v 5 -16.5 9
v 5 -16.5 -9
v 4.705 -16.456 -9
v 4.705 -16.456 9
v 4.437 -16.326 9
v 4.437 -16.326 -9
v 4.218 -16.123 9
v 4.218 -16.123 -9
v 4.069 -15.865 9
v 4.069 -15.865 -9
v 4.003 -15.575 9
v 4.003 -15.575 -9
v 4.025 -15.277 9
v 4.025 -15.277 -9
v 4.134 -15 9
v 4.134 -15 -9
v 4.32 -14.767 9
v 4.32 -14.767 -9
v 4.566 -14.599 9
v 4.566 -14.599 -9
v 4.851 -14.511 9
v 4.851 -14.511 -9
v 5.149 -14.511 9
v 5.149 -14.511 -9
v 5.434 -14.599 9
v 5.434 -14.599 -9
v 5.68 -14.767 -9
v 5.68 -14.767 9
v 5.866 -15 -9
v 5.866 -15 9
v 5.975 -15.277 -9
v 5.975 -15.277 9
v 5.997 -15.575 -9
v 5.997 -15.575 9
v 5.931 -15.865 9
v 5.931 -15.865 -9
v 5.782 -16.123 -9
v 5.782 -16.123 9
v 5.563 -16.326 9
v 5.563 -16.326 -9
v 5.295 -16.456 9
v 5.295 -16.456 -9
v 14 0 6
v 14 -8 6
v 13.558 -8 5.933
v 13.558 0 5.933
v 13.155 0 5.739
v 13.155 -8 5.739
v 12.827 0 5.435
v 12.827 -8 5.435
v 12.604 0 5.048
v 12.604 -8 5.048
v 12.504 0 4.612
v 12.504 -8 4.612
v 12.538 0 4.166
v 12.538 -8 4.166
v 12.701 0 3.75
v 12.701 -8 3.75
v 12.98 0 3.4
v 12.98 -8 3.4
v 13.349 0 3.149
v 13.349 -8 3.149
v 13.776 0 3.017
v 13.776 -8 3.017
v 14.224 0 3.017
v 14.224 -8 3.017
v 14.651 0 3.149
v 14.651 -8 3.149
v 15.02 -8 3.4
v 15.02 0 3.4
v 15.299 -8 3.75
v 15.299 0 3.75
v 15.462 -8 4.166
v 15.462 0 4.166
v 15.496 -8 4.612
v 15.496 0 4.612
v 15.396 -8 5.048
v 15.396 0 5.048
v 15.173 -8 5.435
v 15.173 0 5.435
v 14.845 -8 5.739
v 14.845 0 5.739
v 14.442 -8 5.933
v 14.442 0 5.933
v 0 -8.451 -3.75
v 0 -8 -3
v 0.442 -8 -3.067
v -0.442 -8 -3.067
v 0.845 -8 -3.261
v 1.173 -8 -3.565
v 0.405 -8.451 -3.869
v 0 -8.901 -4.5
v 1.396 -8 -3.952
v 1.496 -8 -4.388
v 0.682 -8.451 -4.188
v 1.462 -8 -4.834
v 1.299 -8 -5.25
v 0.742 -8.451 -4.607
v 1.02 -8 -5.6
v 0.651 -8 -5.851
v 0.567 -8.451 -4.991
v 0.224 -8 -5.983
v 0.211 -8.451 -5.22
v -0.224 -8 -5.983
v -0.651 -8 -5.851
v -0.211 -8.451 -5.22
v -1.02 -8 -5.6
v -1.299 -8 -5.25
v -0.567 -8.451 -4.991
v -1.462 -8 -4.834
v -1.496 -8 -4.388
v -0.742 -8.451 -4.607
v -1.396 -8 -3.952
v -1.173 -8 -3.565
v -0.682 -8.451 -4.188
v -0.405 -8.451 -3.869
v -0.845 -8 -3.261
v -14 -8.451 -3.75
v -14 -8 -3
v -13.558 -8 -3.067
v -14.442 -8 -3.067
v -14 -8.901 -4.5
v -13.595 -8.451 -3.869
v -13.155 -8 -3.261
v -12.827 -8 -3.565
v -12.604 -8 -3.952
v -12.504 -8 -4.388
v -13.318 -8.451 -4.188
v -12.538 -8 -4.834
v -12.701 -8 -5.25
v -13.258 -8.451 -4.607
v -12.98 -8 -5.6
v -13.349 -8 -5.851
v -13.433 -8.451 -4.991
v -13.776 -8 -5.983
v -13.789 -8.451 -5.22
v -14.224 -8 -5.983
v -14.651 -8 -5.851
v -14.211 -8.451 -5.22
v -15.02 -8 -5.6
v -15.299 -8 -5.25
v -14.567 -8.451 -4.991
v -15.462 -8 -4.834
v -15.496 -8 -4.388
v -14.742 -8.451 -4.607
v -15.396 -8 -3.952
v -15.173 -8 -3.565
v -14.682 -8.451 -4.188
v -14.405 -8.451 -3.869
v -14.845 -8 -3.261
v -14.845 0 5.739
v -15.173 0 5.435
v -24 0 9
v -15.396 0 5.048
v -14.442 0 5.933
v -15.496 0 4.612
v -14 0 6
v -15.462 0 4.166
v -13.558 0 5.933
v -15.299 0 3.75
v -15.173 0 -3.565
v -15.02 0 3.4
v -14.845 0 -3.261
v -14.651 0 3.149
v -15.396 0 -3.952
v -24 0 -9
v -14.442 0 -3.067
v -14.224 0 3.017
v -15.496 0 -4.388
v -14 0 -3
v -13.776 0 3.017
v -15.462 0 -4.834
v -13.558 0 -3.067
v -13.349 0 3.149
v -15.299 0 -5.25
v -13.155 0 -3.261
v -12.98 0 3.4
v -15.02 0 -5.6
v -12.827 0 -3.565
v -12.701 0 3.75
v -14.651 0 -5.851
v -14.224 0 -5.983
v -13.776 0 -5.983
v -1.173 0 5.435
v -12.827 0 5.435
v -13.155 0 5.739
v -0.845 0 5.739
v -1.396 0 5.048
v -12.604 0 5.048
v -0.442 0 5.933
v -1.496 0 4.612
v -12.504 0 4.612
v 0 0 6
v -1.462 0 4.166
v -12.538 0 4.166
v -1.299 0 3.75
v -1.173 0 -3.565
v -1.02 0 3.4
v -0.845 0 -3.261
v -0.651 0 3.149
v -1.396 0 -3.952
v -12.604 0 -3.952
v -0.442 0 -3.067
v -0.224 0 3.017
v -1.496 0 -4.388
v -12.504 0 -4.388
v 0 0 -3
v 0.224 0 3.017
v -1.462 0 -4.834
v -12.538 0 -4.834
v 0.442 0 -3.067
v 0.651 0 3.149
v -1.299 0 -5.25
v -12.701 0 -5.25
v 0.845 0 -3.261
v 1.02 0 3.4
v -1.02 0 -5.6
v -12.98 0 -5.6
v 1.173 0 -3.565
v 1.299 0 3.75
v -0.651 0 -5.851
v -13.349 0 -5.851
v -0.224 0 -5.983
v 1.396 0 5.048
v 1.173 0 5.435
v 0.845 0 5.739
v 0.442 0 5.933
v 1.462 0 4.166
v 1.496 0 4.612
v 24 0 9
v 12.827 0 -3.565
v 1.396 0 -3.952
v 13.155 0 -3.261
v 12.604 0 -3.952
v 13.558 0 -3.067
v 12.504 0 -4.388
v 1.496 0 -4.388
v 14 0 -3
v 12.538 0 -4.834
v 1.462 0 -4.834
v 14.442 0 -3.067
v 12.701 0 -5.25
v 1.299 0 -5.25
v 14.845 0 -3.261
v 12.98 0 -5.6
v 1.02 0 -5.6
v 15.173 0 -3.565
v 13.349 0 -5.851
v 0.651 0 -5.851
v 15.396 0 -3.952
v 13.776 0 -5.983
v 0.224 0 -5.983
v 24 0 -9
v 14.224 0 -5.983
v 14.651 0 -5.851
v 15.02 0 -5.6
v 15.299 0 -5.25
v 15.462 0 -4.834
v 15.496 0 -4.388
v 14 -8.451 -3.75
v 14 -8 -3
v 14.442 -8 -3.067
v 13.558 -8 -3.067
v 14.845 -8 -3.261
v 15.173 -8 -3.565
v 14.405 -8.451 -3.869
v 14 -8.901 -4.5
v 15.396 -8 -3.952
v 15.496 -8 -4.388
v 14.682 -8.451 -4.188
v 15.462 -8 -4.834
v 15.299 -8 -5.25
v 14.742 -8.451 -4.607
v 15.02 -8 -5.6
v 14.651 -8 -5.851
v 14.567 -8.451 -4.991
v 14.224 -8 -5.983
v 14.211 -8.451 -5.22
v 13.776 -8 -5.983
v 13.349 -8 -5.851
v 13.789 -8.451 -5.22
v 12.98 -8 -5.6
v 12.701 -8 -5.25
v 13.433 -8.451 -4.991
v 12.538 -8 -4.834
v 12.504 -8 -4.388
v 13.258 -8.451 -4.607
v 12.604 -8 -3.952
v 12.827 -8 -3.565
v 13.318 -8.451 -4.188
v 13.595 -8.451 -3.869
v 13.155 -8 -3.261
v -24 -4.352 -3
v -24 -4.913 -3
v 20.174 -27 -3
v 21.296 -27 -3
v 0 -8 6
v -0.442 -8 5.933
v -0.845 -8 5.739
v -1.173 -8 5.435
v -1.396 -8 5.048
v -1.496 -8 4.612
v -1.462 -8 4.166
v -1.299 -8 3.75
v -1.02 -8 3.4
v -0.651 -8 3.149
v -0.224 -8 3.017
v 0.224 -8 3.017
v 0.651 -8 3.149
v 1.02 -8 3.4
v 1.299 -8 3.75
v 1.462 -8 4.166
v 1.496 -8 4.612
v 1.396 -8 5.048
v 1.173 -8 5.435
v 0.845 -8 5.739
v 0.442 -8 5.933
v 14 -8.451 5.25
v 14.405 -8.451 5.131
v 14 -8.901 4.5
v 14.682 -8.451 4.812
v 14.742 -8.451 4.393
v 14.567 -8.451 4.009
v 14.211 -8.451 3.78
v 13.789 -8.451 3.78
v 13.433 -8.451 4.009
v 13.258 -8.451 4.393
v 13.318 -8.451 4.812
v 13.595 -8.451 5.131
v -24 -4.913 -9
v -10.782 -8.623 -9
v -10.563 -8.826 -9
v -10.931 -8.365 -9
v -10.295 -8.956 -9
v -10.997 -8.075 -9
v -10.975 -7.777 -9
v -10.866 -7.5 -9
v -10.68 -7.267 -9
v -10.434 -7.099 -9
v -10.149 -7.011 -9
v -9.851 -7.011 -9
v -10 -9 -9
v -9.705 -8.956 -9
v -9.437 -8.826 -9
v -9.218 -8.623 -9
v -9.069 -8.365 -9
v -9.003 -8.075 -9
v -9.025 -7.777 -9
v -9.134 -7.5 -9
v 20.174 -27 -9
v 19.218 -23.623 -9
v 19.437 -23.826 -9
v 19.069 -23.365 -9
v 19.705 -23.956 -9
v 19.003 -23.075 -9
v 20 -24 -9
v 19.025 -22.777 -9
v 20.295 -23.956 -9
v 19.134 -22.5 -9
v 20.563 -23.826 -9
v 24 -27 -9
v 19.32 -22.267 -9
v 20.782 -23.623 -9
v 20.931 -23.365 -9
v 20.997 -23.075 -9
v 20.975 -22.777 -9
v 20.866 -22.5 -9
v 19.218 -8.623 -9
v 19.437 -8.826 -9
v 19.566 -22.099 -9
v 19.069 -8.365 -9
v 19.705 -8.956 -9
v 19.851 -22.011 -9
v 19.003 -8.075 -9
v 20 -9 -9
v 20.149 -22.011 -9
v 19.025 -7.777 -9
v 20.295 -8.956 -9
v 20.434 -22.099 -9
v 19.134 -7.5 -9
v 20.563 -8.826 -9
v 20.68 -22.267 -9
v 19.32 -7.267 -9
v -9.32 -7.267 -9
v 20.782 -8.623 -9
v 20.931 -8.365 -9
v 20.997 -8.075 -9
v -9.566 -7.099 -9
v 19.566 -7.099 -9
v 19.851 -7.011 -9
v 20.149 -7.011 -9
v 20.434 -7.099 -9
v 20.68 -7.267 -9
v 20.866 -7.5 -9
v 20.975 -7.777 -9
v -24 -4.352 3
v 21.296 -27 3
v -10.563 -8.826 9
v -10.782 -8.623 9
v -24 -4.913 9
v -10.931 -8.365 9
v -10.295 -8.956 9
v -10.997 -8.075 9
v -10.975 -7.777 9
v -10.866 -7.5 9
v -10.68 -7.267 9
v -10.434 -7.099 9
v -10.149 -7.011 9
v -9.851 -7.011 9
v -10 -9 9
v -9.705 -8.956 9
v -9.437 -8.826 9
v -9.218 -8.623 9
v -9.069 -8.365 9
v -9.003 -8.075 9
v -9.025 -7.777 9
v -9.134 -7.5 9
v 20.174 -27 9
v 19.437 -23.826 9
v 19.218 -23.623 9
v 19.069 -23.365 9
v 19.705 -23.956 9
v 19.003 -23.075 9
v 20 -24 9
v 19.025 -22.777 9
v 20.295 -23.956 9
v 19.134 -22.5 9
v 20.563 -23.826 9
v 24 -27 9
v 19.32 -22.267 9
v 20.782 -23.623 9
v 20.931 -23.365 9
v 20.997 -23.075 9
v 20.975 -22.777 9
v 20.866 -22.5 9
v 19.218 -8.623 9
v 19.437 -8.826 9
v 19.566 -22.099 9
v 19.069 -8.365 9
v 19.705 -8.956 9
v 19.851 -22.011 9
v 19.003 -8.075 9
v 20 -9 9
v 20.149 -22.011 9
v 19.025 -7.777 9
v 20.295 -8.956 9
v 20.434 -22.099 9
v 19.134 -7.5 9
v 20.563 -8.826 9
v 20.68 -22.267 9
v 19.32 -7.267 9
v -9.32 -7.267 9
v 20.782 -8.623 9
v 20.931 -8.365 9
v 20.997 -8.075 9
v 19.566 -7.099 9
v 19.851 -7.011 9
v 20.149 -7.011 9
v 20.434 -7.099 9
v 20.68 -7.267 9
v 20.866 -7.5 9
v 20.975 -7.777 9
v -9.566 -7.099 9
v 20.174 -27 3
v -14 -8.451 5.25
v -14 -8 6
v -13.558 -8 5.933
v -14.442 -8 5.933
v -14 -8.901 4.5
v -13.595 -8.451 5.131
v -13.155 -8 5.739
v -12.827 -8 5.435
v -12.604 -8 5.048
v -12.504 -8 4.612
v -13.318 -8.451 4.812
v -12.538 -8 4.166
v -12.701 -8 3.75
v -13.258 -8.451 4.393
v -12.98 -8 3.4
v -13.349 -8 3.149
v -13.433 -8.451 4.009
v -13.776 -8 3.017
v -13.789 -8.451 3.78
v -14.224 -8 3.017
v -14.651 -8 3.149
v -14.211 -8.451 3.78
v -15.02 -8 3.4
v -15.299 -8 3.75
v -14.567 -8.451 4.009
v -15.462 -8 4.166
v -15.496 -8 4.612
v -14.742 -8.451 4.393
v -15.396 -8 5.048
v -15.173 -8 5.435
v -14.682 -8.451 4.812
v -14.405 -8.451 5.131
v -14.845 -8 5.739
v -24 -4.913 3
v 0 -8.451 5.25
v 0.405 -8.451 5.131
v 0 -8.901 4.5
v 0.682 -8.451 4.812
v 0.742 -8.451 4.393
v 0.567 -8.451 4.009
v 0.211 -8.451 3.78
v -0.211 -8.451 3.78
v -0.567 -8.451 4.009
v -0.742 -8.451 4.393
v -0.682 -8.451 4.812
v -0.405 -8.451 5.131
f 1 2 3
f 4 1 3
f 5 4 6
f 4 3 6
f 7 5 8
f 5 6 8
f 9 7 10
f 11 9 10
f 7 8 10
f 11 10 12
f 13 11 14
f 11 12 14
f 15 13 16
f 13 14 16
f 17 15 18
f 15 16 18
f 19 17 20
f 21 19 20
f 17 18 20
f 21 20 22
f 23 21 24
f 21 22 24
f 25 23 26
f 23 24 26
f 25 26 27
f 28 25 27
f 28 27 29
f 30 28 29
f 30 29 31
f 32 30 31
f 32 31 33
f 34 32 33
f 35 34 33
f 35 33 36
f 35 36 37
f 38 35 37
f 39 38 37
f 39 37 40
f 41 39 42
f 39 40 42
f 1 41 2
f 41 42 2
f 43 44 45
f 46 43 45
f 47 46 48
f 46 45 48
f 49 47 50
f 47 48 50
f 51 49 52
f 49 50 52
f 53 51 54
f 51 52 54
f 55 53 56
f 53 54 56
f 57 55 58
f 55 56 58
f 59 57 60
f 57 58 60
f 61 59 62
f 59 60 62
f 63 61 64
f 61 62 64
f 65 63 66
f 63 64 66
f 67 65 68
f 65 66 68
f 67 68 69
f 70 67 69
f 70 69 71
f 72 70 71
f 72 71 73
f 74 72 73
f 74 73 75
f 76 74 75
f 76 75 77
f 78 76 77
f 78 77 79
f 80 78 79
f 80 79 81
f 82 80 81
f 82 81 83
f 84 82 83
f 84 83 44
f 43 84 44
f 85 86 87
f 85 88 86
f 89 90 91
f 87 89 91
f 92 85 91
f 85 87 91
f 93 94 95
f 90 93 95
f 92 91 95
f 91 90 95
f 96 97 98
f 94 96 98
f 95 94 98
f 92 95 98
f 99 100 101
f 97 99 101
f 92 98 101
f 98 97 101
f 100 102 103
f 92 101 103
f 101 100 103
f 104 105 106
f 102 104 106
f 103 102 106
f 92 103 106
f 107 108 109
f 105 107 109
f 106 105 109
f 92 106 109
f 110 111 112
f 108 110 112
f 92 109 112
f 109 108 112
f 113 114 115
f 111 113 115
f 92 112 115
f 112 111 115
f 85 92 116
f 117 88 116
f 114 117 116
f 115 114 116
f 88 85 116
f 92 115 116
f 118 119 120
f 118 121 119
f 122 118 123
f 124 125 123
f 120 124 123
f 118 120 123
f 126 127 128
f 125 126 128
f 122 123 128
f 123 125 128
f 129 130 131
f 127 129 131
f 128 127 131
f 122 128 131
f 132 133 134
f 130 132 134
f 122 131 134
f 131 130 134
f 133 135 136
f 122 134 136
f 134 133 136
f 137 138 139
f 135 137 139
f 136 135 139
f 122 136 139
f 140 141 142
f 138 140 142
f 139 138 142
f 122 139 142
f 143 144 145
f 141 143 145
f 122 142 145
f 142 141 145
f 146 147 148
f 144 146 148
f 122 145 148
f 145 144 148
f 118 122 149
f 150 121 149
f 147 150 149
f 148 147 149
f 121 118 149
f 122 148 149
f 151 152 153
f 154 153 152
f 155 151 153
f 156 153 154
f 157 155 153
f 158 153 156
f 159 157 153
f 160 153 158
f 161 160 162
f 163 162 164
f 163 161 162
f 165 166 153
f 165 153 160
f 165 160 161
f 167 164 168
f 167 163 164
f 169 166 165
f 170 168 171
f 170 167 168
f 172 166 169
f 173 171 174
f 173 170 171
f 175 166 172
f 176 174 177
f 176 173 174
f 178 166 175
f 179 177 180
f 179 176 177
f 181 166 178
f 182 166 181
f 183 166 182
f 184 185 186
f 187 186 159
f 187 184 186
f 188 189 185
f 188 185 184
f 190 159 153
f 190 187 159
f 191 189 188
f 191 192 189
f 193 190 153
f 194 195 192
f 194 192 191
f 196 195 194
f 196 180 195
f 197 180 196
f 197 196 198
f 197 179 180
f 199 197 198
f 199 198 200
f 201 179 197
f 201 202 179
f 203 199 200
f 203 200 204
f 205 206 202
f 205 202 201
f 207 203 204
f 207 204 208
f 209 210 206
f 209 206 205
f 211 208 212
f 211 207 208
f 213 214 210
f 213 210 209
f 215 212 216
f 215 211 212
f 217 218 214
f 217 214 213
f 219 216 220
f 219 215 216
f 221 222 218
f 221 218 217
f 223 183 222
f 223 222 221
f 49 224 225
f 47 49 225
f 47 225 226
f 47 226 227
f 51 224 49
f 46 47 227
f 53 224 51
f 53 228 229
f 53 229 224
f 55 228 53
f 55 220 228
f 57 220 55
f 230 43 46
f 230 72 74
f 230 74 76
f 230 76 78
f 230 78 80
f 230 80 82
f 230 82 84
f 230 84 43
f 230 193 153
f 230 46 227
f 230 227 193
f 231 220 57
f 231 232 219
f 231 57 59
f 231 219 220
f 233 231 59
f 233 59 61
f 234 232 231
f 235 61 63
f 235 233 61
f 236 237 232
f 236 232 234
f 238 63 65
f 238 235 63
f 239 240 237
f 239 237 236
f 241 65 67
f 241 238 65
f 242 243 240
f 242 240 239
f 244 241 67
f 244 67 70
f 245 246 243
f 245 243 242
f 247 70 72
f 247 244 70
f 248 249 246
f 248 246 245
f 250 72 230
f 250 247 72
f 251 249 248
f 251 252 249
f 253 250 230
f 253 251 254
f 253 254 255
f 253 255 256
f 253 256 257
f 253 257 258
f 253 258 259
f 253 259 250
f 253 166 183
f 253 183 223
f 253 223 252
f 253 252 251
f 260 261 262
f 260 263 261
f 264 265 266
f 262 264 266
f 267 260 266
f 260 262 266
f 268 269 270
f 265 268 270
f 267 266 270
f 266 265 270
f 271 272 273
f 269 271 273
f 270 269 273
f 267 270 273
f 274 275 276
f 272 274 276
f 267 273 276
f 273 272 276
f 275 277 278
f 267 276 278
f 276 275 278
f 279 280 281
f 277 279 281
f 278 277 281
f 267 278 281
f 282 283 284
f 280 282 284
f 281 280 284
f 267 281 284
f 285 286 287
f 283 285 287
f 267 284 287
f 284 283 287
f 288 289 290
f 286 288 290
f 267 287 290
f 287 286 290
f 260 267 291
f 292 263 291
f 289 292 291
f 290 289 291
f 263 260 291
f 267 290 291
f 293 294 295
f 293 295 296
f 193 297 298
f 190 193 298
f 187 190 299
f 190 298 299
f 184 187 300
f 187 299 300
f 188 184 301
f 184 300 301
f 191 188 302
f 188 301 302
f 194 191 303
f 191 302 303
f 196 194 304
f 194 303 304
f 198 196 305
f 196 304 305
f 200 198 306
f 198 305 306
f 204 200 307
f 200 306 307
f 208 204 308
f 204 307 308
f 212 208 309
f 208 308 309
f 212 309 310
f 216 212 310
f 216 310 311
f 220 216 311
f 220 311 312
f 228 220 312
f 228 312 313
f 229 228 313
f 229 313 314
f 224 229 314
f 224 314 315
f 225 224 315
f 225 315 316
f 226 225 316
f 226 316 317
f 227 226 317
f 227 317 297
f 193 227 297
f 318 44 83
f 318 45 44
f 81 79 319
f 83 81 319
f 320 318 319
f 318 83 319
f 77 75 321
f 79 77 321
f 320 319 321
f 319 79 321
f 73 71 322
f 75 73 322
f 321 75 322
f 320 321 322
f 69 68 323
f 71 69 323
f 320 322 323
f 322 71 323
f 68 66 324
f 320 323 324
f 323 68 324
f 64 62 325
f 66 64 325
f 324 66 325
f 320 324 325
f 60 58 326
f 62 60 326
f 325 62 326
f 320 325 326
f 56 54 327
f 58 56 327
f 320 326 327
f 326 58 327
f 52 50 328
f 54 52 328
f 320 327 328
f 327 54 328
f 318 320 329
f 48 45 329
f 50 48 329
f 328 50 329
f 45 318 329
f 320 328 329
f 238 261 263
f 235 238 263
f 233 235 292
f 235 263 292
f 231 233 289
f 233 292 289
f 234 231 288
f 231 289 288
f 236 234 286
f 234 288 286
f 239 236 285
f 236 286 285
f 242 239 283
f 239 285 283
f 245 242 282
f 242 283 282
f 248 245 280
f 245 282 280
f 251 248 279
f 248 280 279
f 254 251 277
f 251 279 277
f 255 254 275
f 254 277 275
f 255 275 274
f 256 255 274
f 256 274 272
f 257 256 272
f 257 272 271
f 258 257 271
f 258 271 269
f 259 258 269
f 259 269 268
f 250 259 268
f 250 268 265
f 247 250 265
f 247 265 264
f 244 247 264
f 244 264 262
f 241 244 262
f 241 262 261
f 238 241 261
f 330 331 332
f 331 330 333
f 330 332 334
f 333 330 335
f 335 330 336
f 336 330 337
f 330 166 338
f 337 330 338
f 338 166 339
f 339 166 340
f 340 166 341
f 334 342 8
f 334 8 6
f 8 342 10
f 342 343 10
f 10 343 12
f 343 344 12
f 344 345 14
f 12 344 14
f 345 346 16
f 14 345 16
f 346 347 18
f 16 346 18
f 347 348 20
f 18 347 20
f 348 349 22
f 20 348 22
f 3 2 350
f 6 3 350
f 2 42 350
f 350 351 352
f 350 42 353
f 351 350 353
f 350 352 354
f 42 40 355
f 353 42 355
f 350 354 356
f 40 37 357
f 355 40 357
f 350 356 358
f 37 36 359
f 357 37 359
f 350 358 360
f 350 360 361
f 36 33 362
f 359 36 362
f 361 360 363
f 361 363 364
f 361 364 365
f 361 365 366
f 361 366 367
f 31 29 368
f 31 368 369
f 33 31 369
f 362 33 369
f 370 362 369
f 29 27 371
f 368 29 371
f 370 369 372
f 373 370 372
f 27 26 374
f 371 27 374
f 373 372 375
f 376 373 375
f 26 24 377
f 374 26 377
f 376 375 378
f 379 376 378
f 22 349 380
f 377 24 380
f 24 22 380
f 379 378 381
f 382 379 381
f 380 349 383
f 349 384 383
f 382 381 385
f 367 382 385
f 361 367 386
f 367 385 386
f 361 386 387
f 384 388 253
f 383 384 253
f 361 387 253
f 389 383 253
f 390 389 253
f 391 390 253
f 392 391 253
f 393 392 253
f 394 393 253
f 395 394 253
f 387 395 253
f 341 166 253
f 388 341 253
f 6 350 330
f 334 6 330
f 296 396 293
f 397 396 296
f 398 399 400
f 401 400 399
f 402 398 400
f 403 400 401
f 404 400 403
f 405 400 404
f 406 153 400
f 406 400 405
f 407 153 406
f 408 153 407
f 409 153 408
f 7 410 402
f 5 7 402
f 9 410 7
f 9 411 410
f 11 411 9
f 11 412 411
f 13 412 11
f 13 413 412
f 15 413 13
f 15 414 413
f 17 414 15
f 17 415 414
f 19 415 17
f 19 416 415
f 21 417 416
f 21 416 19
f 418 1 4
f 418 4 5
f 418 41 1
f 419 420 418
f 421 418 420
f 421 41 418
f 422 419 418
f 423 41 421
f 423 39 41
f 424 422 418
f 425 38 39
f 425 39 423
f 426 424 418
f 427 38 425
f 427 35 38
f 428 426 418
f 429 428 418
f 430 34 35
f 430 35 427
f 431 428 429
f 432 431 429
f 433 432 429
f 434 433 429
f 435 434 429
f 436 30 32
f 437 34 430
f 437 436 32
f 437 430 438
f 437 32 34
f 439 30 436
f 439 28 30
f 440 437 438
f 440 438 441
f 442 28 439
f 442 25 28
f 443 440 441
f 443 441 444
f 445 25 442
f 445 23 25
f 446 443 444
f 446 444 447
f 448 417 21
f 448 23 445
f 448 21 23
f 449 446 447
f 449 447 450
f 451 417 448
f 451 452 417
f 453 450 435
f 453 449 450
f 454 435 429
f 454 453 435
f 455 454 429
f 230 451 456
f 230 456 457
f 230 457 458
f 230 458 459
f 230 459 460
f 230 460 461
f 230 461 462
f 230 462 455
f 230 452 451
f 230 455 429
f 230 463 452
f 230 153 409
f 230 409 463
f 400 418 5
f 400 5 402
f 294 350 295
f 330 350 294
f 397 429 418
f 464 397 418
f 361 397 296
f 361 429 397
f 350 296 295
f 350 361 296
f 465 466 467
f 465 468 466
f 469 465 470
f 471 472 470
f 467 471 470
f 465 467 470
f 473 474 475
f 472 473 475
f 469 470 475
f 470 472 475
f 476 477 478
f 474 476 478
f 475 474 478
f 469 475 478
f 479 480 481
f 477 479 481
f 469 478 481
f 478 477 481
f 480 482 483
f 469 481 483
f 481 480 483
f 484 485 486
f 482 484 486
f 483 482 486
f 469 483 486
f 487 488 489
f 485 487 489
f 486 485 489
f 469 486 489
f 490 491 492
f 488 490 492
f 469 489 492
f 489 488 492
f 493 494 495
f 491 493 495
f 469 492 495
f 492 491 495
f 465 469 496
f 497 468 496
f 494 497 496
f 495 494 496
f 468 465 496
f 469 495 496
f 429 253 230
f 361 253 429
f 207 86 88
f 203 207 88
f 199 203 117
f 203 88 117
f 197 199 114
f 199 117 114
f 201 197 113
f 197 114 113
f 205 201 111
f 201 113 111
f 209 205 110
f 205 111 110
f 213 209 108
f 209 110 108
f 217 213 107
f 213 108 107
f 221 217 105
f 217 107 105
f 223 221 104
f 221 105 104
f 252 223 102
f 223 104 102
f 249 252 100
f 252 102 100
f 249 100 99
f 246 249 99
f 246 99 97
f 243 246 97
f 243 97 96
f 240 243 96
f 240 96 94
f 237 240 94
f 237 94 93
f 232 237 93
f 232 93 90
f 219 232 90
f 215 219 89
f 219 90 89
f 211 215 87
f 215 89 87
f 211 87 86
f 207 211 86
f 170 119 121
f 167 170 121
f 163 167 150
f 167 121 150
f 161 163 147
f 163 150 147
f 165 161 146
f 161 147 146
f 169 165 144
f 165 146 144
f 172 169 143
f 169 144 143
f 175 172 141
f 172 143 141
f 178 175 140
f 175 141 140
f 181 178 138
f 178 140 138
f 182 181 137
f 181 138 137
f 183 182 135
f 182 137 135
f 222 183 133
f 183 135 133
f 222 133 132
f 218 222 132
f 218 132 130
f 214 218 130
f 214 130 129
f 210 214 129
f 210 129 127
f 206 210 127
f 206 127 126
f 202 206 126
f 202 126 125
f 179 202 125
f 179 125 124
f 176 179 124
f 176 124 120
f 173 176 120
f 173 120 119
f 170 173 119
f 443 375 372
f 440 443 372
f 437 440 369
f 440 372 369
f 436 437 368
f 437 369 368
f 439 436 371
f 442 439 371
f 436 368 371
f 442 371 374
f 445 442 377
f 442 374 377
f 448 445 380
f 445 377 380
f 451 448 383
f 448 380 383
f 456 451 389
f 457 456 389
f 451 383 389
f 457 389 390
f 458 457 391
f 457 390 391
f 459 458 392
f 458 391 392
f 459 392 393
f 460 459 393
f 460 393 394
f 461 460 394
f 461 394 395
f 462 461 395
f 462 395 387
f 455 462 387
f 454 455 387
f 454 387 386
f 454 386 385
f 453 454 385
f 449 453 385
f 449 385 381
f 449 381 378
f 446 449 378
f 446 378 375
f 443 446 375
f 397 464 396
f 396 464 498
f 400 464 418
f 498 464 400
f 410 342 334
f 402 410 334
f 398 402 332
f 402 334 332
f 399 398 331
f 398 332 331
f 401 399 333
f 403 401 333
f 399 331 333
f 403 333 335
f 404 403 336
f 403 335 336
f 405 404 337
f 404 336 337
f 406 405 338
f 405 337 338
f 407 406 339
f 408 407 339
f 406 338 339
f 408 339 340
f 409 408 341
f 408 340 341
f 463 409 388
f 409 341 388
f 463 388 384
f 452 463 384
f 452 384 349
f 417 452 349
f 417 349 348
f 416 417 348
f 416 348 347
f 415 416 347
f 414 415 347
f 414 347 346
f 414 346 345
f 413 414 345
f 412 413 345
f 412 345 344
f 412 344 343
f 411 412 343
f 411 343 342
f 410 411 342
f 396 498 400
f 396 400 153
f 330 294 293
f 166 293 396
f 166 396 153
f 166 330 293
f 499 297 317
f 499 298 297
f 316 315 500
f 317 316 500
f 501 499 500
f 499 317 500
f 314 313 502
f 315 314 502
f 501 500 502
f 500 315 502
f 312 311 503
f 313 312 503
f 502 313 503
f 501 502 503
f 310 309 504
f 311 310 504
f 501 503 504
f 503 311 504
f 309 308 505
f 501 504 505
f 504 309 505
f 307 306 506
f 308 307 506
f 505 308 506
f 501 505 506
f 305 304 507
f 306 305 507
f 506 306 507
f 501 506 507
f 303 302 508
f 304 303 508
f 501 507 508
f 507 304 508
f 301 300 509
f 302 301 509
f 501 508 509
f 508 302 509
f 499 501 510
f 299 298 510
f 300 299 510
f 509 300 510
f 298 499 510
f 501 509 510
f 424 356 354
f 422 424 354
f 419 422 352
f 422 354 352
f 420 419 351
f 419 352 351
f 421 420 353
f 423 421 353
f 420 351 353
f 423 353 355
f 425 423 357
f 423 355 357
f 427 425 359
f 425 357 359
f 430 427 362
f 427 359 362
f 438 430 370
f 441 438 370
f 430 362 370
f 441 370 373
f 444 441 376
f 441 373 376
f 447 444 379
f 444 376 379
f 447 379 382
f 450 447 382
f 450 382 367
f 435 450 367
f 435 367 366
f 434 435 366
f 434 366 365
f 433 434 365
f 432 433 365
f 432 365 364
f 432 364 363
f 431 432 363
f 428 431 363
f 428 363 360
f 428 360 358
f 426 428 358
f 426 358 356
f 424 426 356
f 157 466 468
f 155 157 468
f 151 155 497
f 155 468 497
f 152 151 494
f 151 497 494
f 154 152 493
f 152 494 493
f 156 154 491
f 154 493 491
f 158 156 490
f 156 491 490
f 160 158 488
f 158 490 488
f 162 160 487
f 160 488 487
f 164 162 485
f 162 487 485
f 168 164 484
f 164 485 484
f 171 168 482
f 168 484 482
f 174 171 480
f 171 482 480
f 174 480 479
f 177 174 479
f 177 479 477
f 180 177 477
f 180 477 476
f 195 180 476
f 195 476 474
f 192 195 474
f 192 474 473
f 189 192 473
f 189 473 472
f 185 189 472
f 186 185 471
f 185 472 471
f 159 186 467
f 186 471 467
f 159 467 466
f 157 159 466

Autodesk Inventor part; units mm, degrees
ref_plane "YZ Plane" through (0, 0, 0) normal (1, 0, 0) x (0, 1, 0)
ref_plane "XZ Plane" through (0, 0, 0) normal (0, 1, 0) x (-1, 0, 0)
sketch "Sketch2" plane through (0, 0, 0) normal (0, 0, 1) x (1, 0, 0)
  line L0 (20, -8) -> (-10, -8) construction
  line L1 (-10, -8) -> (-10, -23) construction
  line L2 (-10, -23) -> (20, -23) construction
  line L3 (20, -23) -> (20, -8) construction
  line L4 (20, -8) -> (-10, -23) construction
  line L5 (-10, -8) -> (20, -23) construction
  point P0 (5, -15.5)
  point P1 (5, -15.5)
  point P2 (0, 0)
  dimension "d2" = 30
  dimension "d3" = 15
  dimension "d4" = 5
  dimension "d5" = 8
sketch "Sketch3" plane through (0, 0, 0) normal (0, 0, 1) x (1, 0, 0)
  line L0 (24, 0) -> (24, -27)
  line L1 (24, -27) -> (20.1738, -27)
  line L2 (20.1738, -27) -> (-24, -4.9131)
  line L3 (-24, -4.9131) -> (-24, 0)
  line L4 (-24, 0) -> (24, 0)
  line L5 (20, -23) -> (-10, -8) construction
  point P0 (0, 0)
  point P1 (5, -15.5)
  point P2 (20, -8)
  dimension "d6" = 4
  dimension "d8" = 3.5
  dimension "d9" = 4
extrude "Extrusion1" add sketch "Sketch3" along normal mid plane 18
sketch "Sketch4" plane through (0, 0, 9) normal (0, 0, 1) x (1, 0, 0)
  point P0 (0, 0)
  point P1 (20, -23)
  point P2 (5, -15.5)
  point P3 (-10, -8)
  point P4 (20, -8)
hole "Hole1" at (20, -23, 9) at (5, -15.5, 9) at (-10, -8, 9) at (20, -8, 9) direction (0, 0, -1) diameter 2 end through all
ref_plane "Work Plane1" through (21.5154, -24.3167, -9) normal (-0.4472, -0.8944, 0) x (0.8944, -0.4472, 0)
sketch "Sketch9" plane through (20.1738, -27, -9) normal (-0.4472, -0.8944, 0) x (0.8944, -0.4472, 0)
  line L0 (19.8813, 12) -> (-80.1187, 12)
  line L1 (-80.1187, 12) -> (-80.1187, 6)
  line L2 (-80.1187, 6) -> (19.8813, 6)
  line L3 (19.8813, 6) -> (19.8813, 12)
  line L4 (19.8813, 12) -> (-80.1187, 6) construction
  line L5 (-80.1187, 12) -> (19.8813, 6) construction
  point P0 (-30.1187, 9)
  dimension "d54" = 6
  dimension "d55" = 100
extrude "Extrusion2" cut sketch "Sketch9" against normal blind 0.5
sketch "Sketch10" plane through (-24, 0, 9) normal (0, 1, 0) x (1, 0, 0)
  line L0 (24, 9) -> (42.9051, 9) construction
  point P0 (24, 13.5)
  point P1 (24, 4.5)
  point P2 (10, 13.5)
  point P3 (10, 4.5)
  point P4 (38, 4.5)
  point P5 (38, 13.5)
  dimension "d58" = 9
  dimension "d59" = 14
  dimension "d60" = 14
hole "Hole6" at (0, 0, -4.5) at (0, 0, 4.5) at (-14, 0, -4.5) at (-14, 0, 4.5) at (14, 0, 4.5) at (14, 0, -4.5) direction (0, -1, 0) diameter 3 depth 8 tip angle 118
properties part number "wrist adapter"
